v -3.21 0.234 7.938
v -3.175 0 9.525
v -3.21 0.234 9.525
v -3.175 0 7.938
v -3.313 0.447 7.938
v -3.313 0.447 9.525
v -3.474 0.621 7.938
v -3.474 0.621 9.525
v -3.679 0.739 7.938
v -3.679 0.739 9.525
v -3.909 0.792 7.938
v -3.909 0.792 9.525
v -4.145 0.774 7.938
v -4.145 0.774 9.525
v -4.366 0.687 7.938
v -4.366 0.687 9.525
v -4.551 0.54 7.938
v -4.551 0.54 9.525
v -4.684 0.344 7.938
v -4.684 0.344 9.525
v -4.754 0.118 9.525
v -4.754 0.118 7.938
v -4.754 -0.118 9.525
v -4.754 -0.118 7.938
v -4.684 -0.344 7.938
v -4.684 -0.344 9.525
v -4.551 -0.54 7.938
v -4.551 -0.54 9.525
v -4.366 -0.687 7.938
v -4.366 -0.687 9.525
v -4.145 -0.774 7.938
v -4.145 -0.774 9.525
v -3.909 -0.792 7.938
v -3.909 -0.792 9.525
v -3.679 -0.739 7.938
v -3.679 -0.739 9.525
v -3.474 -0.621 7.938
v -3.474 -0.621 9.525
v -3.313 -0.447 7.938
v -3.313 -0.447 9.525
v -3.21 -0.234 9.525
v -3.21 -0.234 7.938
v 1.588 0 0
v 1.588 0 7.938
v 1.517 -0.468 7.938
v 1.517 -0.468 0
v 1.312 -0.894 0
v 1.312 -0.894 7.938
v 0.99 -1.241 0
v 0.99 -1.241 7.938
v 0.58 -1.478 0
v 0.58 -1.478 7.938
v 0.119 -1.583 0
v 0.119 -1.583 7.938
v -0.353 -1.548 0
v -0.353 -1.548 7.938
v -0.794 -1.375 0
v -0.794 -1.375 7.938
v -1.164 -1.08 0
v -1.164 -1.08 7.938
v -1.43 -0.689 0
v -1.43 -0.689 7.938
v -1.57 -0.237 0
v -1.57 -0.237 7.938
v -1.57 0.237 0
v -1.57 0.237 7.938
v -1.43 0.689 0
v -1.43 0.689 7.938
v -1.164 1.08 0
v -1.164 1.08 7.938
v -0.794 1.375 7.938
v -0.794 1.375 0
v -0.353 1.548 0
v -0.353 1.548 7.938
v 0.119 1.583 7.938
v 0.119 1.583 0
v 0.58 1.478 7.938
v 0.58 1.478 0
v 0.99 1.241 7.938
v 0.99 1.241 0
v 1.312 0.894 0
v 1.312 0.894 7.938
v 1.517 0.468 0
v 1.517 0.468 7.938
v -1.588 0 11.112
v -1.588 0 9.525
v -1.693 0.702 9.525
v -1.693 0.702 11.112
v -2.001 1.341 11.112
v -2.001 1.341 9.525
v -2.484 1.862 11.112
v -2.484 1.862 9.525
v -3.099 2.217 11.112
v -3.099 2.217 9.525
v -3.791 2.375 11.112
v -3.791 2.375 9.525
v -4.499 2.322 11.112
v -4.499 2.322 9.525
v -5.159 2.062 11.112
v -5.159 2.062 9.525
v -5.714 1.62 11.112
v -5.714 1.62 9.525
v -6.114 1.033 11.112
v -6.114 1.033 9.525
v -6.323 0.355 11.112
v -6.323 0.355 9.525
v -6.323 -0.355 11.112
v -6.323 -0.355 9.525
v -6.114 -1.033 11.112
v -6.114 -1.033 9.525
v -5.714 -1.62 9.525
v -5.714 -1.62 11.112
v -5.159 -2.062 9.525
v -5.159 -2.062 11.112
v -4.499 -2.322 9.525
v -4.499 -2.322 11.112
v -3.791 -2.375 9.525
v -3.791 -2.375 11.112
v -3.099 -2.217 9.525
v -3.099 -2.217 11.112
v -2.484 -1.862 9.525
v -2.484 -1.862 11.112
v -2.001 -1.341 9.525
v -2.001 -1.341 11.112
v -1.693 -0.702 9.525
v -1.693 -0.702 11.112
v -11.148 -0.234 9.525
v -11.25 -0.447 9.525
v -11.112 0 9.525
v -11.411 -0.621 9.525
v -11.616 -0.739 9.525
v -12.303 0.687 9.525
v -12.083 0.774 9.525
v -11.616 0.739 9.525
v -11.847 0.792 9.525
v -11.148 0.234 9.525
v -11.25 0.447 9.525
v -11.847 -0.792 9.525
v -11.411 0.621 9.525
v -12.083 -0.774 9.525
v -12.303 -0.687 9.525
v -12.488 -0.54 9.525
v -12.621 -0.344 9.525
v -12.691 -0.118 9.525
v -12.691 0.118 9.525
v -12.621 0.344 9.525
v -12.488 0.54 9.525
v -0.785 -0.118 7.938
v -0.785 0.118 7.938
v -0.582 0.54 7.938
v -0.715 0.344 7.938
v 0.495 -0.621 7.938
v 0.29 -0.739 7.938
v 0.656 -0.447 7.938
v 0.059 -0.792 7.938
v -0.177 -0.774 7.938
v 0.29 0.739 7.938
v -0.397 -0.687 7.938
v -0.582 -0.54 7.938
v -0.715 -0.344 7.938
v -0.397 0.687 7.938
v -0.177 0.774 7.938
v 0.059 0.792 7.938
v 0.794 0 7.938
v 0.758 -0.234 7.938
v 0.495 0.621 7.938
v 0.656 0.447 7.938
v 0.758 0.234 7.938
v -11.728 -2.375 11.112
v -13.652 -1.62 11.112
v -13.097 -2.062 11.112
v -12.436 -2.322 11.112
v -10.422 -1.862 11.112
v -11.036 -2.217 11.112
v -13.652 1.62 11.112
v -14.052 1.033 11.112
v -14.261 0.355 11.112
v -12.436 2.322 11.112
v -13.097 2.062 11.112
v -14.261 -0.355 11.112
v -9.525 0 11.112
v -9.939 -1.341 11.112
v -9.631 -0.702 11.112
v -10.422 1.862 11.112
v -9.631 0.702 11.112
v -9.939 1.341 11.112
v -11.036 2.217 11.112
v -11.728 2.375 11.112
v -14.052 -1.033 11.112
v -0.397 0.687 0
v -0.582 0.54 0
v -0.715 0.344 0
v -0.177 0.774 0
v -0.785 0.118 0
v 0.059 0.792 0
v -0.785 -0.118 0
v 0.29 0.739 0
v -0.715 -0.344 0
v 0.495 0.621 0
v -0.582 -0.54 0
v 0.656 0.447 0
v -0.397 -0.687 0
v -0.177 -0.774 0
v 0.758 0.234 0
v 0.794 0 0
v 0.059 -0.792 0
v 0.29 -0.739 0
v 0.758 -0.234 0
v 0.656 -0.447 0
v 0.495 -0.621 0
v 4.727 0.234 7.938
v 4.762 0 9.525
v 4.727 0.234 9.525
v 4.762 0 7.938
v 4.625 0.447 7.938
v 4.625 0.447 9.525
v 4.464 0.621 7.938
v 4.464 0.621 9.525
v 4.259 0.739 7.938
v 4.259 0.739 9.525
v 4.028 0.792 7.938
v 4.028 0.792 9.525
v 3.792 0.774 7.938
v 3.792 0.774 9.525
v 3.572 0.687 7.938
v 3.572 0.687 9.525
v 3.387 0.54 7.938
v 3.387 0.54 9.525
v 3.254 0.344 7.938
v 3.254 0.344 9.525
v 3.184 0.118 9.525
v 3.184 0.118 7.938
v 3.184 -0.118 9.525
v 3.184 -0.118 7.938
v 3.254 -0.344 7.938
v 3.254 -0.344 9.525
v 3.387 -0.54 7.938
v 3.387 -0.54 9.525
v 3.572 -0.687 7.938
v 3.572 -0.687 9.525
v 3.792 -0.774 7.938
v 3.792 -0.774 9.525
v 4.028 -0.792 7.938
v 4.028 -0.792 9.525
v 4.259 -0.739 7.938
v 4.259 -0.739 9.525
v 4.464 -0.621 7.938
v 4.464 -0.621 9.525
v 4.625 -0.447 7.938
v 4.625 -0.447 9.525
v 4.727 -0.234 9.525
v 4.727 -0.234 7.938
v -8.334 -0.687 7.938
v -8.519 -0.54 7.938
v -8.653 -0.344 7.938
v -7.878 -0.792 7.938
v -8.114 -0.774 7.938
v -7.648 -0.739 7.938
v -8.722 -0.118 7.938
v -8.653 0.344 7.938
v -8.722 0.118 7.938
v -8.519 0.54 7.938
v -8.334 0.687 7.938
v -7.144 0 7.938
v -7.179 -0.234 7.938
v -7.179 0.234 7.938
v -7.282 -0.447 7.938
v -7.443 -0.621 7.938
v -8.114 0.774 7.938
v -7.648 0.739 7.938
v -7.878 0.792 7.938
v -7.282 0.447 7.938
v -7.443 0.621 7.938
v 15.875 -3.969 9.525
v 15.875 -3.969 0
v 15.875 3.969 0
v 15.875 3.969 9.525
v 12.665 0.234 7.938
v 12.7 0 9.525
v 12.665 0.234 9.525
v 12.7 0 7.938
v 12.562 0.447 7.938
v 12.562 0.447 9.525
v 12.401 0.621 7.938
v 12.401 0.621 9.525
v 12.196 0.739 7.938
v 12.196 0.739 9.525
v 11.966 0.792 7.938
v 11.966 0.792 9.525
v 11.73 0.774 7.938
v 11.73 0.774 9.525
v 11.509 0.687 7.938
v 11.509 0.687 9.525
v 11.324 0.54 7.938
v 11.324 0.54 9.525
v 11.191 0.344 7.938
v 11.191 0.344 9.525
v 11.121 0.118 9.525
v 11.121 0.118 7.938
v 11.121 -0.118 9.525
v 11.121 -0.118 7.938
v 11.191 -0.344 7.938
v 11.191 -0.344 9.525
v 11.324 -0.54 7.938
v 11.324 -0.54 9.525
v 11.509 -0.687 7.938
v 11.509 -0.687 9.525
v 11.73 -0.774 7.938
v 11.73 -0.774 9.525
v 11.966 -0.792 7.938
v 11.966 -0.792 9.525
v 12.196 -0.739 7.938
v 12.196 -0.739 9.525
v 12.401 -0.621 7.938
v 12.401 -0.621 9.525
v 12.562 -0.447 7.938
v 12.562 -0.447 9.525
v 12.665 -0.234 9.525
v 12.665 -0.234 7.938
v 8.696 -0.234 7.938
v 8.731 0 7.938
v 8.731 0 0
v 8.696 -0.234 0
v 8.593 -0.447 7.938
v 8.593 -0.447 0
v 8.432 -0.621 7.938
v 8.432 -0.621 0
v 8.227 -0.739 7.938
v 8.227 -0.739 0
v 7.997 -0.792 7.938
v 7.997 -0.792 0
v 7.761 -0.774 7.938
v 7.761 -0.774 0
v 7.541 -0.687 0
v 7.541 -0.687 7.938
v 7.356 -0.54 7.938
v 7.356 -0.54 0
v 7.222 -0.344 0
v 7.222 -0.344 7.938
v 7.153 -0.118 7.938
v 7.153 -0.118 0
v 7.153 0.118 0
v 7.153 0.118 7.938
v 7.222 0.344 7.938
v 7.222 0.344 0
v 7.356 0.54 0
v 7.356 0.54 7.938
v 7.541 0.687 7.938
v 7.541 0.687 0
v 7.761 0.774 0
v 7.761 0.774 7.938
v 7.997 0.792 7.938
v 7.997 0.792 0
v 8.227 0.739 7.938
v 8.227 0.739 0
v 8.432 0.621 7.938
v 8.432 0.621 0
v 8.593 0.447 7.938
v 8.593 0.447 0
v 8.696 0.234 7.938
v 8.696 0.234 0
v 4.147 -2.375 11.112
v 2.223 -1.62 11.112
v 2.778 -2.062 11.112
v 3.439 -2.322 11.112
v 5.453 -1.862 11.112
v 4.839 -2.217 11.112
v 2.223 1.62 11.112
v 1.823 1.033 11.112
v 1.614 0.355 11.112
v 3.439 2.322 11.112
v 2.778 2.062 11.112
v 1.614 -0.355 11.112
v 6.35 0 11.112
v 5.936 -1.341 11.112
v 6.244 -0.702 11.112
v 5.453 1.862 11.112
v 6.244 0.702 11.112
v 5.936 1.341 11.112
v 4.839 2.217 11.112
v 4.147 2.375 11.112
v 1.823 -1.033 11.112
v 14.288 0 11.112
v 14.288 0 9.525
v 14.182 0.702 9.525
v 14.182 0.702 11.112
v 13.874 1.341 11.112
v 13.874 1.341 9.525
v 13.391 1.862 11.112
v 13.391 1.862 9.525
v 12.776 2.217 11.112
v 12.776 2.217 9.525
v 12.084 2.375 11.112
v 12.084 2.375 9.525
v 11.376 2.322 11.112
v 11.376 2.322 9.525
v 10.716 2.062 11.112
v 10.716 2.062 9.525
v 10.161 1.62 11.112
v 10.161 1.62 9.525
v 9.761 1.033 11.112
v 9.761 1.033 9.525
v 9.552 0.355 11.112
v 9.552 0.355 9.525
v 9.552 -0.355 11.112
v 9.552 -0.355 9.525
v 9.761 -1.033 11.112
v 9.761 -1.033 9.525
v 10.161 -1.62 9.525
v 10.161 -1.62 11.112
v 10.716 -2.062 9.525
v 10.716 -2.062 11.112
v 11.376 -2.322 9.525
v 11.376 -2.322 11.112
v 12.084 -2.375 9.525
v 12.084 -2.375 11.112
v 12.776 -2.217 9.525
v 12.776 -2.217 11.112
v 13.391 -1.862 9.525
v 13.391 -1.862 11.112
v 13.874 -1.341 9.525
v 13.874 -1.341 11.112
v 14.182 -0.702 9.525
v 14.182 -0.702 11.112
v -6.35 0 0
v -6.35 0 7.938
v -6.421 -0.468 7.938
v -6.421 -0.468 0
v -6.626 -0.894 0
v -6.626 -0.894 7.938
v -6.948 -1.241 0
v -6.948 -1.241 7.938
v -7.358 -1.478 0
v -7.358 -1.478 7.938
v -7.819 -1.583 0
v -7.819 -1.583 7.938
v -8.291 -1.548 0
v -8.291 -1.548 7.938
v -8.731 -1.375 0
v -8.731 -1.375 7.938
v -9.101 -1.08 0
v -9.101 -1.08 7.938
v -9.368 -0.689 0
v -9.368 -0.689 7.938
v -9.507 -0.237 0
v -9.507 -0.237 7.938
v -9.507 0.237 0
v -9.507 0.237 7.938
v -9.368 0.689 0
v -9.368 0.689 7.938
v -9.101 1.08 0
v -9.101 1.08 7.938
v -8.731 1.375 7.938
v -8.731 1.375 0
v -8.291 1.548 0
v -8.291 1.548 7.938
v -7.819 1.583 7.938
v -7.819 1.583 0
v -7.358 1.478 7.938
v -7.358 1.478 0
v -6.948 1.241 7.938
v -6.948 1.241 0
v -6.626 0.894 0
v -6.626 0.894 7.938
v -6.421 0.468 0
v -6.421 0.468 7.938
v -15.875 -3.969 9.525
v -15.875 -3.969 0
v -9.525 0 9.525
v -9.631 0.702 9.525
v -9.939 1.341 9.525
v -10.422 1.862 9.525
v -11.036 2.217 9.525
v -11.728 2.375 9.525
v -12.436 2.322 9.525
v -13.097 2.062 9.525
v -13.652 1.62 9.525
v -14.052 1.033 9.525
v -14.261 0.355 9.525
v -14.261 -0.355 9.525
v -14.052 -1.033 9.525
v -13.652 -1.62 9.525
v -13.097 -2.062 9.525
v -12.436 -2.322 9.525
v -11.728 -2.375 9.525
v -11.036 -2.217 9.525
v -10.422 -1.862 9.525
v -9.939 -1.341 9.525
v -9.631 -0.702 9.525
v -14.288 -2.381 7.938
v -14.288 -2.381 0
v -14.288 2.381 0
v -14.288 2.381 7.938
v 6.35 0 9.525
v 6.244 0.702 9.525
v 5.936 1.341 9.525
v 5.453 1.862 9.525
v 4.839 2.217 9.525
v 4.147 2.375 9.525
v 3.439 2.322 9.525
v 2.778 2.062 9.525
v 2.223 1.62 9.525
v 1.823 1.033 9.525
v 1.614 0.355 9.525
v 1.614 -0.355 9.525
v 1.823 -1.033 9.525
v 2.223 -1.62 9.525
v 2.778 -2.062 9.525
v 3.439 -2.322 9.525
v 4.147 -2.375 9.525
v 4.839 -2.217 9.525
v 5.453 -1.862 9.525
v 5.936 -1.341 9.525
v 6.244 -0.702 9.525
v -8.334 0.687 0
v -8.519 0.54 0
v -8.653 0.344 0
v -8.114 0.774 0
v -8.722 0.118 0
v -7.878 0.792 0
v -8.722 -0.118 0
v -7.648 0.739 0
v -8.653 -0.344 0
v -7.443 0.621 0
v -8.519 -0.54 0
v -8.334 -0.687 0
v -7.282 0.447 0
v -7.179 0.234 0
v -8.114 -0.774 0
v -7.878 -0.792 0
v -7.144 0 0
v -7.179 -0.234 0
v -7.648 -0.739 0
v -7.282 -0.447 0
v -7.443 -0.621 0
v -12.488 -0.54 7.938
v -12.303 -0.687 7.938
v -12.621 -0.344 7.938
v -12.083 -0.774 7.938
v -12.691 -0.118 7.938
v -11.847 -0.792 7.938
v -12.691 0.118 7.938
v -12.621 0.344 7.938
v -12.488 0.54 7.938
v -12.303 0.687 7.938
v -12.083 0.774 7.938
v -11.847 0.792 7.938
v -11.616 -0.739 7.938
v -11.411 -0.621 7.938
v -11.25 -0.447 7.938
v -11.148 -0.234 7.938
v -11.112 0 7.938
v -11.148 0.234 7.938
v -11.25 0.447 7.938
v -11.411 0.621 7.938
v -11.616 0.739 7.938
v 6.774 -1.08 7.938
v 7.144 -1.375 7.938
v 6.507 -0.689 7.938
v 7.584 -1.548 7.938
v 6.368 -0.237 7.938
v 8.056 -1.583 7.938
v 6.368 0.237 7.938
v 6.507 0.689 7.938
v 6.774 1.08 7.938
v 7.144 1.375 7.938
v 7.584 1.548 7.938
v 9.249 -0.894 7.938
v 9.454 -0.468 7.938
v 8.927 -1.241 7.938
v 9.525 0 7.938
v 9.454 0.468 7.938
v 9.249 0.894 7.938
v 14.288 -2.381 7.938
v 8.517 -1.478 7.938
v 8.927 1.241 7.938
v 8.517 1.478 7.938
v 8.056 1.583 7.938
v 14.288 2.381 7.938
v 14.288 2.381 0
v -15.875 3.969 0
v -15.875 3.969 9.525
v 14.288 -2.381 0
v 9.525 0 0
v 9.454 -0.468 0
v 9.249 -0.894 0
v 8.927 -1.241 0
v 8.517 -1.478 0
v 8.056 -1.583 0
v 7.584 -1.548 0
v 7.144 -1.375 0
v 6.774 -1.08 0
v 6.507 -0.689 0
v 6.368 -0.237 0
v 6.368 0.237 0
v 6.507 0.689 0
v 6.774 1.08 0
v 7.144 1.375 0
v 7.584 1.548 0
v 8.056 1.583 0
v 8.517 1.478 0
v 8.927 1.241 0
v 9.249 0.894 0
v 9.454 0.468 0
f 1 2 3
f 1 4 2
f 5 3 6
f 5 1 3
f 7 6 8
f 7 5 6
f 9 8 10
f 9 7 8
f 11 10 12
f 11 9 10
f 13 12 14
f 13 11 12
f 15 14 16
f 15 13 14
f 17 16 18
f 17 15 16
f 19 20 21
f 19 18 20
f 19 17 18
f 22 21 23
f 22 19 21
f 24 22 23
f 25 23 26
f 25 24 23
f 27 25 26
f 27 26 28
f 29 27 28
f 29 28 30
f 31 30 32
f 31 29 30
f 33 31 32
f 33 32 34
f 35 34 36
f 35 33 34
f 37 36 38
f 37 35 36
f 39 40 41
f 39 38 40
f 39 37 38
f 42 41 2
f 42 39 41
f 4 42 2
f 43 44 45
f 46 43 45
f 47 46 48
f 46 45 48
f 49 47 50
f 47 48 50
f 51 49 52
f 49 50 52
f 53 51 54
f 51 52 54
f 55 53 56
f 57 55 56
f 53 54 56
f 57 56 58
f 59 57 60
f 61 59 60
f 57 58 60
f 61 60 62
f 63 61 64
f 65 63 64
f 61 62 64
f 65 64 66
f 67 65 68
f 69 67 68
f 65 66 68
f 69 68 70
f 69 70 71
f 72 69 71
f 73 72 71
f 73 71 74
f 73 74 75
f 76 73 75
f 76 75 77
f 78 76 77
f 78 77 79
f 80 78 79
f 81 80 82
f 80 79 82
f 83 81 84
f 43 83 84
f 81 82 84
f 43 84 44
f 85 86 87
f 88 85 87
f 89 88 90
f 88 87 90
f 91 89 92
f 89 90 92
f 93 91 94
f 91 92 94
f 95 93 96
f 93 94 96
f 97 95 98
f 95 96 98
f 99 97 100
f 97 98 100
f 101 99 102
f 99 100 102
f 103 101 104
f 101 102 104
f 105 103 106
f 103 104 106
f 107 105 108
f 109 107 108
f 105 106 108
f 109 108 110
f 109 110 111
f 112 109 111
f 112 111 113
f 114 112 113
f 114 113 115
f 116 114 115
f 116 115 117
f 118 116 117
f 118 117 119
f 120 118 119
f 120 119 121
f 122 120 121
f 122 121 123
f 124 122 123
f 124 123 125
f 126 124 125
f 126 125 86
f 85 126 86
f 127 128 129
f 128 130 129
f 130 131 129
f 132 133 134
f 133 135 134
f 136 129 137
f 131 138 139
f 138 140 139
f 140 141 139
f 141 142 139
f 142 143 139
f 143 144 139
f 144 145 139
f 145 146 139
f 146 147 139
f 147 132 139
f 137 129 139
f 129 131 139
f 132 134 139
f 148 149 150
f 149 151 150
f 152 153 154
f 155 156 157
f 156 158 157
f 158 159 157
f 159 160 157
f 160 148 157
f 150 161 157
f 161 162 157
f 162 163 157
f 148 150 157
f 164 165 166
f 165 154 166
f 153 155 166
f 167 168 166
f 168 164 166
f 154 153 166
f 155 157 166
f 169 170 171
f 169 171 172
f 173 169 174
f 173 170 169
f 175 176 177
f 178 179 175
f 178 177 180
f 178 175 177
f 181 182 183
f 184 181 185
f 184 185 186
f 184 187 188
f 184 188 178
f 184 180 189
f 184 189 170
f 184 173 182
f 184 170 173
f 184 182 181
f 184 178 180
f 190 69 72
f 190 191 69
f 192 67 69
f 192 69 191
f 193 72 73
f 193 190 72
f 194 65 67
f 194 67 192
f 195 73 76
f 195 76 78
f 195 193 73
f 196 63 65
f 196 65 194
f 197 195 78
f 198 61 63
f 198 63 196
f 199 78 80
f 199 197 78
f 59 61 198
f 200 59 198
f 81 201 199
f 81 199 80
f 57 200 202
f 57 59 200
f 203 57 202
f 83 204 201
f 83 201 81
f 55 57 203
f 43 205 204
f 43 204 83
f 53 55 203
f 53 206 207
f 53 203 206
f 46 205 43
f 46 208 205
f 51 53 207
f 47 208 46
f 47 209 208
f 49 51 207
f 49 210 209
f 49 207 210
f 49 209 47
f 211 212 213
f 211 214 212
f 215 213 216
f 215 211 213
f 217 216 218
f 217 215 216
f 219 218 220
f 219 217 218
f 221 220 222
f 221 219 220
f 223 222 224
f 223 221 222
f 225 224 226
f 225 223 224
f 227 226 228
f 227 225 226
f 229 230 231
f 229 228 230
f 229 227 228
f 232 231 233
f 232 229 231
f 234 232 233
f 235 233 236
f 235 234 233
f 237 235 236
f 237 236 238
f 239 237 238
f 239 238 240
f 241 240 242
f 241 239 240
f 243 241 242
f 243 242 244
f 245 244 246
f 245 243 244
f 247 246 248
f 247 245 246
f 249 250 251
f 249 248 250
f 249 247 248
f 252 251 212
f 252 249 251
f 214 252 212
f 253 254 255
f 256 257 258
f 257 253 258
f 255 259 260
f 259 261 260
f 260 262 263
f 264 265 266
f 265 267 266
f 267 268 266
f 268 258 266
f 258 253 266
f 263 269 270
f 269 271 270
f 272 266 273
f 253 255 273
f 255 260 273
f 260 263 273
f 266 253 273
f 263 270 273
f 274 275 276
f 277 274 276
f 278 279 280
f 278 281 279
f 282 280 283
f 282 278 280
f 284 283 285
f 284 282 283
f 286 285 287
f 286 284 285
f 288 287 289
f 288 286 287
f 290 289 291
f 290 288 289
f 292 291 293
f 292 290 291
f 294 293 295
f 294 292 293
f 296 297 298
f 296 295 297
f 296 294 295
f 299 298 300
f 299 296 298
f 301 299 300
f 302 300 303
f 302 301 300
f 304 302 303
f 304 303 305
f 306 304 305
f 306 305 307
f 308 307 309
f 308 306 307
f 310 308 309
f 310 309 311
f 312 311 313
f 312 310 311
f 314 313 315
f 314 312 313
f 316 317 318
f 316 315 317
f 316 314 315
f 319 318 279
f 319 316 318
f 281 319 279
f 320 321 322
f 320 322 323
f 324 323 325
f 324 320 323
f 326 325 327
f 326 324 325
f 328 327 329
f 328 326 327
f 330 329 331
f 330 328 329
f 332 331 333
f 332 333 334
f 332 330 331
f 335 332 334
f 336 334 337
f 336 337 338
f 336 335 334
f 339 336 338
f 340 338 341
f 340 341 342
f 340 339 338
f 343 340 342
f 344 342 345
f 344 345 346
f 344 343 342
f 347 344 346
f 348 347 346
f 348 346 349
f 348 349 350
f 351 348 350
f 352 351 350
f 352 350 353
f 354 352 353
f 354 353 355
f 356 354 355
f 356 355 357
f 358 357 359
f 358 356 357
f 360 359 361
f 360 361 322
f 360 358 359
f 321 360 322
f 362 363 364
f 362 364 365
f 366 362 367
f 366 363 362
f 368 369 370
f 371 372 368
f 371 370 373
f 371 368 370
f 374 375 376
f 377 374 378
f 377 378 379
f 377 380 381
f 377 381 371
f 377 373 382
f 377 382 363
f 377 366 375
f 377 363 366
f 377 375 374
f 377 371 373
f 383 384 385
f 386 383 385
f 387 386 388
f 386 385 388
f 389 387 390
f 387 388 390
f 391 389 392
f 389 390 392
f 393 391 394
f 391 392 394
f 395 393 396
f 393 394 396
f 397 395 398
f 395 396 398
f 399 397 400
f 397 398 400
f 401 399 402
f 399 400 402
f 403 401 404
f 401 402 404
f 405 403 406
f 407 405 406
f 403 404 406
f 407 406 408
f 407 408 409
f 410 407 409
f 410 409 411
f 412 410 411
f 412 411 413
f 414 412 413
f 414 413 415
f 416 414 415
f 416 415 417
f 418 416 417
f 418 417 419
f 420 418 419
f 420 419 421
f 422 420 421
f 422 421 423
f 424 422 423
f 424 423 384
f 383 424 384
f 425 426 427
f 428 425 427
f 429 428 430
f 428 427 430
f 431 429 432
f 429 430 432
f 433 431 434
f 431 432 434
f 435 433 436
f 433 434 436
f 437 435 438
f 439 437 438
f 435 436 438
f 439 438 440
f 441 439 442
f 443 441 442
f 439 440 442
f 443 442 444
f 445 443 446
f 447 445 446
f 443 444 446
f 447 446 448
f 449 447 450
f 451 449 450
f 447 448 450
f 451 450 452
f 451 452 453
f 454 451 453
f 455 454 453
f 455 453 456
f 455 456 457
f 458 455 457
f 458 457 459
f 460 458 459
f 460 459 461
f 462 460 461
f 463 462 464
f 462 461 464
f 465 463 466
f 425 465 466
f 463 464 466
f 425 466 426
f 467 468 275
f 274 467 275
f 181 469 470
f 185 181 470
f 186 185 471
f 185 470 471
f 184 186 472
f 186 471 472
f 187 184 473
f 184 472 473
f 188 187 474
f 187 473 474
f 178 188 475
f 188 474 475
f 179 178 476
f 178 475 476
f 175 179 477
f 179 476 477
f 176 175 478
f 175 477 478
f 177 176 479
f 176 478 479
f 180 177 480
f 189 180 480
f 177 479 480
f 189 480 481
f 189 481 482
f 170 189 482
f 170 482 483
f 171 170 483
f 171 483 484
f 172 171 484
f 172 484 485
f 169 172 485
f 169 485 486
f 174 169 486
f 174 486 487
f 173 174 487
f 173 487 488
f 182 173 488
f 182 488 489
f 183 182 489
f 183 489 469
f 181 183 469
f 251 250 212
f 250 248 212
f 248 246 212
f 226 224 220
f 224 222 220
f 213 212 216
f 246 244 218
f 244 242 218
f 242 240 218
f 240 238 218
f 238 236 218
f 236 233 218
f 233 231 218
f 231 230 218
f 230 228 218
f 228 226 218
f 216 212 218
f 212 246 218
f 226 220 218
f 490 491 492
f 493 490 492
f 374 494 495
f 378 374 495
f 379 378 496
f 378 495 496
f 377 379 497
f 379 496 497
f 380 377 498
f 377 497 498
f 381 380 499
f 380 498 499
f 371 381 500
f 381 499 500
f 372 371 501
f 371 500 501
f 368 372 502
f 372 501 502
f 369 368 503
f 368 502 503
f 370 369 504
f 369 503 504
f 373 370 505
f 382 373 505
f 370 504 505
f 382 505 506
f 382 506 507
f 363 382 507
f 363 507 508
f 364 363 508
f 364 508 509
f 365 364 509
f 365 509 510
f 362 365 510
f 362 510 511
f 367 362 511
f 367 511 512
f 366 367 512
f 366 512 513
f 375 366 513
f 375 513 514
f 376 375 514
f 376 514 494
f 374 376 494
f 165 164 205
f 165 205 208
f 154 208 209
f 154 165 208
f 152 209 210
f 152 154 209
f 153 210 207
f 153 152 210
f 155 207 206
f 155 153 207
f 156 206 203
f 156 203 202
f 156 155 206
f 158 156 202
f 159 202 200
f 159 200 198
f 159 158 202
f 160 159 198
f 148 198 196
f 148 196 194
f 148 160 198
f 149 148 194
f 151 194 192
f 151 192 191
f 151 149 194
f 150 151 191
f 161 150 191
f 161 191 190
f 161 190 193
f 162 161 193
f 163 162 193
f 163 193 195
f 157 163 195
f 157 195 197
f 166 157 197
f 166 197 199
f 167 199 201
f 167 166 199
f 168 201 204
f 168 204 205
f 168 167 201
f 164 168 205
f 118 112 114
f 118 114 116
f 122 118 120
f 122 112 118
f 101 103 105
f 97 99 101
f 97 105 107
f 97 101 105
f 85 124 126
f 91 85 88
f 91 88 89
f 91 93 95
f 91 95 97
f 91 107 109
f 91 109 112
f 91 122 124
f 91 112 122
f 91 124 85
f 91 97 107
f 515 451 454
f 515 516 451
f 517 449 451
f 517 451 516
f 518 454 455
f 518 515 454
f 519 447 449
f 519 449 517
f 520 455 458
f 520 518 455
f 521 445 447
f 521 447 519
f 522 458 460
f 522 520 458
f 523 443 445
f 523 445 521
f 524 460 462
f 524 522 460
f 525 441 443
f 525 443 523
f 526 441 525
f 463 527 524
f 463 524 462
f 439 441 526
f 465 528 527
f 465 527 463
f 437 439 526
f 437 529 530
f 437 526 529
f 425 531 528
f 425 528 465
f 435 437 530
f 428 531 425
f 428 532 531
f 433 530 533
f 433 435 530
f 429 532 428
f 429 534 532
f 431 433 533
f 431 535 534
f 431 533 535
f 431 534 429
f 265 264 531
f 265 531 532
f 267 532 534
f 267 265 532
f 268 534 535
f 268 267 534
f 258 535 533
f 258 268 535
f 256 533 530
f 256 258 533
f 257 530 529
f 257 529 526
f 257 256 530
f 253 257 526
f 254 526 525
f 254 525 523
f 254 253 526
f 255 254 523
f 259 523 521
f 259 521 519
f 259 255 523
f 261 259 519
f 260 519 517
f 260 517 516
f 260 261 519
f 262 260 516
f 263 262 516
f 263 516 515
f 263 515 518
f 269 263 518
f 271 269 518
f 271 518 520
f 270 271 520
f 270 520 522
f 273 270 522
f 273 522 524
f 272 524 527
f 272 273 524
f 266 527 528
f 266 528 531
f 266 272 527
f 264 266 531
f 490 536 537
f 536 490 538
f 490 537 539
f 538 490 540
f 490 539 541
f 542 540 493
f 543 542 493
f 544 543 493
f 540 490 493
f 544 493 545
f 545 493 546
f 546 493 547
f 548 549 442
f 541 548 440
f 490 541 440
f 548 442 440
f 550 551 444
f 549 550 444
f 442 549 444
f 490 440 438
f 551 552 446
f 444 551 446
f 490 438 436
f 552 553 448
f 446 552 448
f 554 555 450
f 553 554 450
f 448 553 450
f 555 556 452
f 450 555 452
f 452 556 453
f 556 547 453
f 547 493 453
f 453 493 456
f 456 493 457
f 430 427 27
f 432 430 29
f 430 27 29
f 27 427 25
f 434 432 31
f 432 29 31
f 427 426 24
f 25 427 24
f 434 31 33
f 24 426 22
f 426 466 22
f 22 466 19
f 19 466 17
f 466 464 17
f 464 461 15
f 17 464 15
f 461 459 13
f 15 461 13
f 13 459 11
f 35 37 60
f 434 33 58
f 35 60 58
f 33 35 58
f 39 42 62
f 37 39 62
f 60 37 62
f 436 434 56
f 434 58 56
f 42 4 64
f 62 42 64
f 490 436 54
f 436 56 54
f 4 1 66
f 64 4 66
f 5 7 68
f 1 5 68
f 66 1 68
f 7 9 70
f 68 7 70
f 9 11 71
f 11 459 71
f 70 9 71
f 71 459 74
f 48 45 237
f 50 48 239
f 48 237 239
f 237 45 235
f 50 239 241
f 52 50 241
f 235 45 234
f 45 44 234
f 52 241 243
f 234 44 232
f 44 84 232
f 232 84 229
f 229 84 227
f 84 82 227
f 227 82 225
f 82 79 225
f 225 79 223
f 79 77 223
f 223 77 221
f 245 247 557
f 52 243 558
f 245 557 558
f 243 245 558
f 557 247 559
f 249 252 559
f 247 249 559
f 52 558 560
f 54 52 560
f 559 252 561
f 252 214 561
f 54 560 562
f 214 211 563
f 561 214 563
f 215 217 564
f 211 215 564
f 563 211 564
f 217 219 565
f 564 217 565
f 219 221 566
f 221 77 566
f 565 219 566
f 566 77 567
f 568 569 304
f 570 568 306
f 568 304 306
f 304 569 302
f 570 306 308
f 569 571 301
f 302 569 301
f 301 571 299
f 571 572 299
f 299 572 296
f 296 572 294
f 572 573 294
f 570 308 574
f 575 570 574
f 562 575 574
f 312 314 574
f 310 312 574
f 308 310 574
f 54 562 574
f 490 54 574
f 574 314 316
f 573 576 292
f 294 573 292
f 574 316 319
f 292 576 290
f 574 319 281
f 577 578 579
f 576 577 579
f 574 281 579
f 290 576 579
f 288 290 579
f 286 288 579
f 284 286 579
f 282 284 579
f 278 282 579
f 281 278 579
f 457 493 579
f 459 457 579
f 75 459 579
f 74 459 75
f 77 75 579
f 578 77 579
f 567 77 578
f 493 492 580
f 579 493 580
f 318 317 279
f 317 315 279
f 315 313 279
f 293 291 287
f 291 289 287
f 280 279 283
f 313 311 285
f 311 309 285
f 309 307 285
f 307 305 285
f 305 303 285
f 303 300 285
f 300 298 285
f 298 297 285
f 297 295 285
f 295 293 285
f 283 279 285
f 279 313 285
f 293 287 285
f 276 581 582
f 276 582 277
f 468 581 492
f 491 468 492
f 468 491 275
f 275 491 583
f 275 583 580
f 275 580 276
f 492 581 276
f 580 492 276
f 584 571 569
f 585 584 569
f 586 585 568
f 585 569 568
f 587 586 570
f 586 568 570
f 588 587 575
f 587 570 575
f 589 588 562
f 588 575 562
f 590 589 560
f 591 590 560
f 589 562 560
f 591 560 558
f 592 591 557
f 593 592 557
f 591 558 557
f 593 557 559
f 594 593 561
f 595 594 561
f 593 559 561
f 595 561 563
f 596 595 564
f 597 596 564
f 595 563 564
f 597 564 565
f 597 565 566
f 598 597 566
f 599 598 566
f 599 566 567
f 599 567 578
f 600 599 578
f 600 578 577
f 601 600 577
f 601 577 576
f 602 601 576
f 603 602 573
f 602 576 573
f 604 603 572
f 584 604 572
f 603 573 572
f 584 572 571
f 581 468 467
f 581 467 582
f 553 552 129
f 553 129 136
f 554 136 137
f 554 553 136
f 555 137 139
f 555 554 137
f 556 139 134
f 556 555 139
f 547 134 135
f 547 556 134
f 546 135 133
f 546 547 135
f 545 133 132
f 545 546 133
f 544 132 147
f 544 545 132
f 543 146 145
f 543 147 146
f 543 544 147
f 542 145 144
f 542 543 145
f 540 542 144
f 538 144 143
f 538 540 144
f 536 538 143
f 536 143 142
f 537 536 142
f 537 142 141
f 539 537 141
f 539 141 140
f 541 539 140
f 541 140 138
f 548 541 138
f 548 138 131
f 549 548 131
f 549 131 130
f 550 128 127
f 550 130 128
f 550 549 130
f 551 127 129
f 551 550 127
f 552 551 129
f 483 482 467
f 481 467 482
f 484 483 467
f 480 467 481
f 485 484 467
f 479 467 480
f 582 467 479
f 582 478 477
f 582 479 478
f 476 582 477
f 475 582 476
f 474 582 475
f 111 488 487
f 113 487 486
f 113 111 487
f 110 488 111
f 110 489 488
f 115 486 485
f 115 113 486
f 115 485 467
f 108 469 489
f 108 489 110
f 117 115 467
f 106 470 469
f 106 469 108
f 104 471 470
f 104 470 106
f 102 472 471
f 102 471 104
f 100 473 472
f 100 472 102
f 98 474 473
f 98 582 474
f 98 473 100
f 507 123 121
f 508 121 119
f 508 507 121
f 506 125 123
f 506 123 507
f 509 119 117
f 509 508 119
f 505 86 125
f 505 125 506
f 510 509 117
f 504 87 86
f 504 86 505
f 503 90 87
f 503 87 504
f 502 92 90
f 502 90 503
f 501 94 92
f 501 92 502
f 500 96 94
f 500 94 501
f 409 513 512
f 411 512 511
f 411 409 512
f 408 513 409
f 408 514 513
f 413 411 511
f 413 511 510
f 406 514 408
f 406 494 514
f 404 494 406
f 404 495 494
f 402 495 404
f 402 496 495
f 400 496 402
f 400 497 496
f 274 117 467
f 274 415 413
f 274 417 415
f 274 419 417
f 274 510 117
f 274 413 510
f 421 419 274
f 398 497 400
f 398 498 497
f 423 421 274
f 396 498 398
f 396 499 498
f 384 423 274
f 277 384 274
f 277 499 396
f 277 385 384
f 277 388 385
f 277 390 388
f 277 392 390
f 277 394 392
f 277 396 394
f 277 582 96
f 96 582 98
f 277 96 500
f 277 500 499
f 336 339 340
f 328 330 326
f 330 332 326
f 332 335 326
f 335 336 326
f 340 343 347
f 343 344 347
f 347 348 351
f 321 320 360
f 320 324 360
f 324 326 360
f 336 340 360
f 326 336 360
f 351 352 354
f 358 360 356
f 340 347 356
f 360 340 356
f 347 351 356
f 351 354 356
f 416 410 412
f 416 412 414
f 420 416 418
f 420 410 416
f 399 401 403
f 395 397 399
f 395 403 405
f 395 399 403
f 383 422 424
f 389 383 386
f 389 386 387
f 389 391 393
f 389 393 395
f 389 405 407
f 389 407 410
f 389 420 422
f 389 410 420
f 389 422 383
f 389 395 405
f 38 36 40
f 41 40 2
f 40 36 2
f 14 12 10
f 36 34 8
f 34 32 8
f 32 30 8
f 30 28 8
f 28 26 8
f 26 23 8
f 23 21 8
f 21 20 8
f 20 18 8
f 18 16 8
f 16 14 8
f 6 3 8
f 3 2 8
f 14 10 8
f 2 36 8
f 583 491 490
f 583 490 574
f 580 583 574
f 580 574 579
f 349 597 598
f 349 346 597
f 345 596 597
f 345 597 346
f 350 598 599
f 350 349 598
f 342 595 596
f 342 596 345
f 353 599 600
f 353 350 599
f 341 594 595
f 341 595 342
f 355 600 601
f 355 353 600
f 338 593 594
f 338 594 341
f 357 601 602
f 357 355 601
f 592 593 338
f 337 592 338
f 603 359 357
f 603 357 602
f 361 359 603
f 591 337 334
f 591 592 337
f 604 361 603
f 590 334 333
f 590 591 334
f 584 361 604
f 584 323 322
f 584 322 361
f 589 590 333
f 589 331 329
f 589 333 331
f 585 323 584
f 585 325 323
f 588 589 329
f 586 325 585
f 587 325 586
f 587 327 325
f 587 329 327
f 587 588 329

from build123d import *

# Parameters (mm, degrees)
F0_W     = 31.75
F0_H     = 7.9375
F0_R     = 2.38125
F1_DEPTH = 9.525
F2_DEPTH = 11.1125
F3_T     = -1.5875
F4_R     = 1.5875
F4_R_2   = 0.79375
F5_DEPTH = 7.9375


# Not quite as in the source:
# - a feature names something its author has since deleted; it is built from what else it names


with BuildPart() as f1:
    # F0 (on Top) → F1 (new body)
    with BuildSketch(Plane.XY):
        Rectangle(F0_W, F0_H)
        with Locations((-11.90625, 0)):
            Circle(F0_R, mode=Mode.SUBTRACT)
        with Locations((-3.96875, 0)):
            Circle(F0_R, mode=Mode.SUBTRACT)
        with Locations((3.96875, 0)):
            Circle(F0_R, mode=Mode.SUBTRACT)
        with Locations((11.90625, 0)):
            Circle(F0_R, mode=Mode.SUBTRACT)
    extrude(amount=F1_DEPTH)

    # F0 (on Top) → F2 (join)
    with BuildSketch(Plane.XY):
        with Locations((-11.90625, 0)):
            Circle(F0_R)
        with Locations((-3.96875, 0)):
            Circle(F0_R)
        with Locations((3.96875, 0)):
            Circle(F0_R)
        with Locations((11.90625, 0)):
            Circle(F0_R)
    extrude(amount=F2_DEPTH)

    # F3
    f3_openings = [f1.faces().sort_by_distance(p)[0] for p in [
        (0, 0, 0),
    ]]
    offset(amount=F3_T, openings=f3_openings, kind=Kind.INTERSECTION)

    # F4 (on face) → F5 (join)
    with BuildSketch(Plane(origin=(0, 0, 7.9375), x_dir=(1, 0, 0), z_dir=(0, 0, -1))):
        with Locations((-7.9375, 0)):
            Circle(F4_R)
        with Locations((-7.9375, 0)):
            Circle(F4_R_2, mode=Mode.SUBTRACT)
        Circle(F4_R)
        Circle(F4_R_2, mode=Mode.SUBTRACT)
        with Locations((7.9375, 0)):
            Circle(F4_R)
        with Locations((7.9375, 0)):
            Circle(F4_R_2, mode=Mode.SUBTRACT)
    extrude(amount=F5_DEPTH)


solid = f1.part
